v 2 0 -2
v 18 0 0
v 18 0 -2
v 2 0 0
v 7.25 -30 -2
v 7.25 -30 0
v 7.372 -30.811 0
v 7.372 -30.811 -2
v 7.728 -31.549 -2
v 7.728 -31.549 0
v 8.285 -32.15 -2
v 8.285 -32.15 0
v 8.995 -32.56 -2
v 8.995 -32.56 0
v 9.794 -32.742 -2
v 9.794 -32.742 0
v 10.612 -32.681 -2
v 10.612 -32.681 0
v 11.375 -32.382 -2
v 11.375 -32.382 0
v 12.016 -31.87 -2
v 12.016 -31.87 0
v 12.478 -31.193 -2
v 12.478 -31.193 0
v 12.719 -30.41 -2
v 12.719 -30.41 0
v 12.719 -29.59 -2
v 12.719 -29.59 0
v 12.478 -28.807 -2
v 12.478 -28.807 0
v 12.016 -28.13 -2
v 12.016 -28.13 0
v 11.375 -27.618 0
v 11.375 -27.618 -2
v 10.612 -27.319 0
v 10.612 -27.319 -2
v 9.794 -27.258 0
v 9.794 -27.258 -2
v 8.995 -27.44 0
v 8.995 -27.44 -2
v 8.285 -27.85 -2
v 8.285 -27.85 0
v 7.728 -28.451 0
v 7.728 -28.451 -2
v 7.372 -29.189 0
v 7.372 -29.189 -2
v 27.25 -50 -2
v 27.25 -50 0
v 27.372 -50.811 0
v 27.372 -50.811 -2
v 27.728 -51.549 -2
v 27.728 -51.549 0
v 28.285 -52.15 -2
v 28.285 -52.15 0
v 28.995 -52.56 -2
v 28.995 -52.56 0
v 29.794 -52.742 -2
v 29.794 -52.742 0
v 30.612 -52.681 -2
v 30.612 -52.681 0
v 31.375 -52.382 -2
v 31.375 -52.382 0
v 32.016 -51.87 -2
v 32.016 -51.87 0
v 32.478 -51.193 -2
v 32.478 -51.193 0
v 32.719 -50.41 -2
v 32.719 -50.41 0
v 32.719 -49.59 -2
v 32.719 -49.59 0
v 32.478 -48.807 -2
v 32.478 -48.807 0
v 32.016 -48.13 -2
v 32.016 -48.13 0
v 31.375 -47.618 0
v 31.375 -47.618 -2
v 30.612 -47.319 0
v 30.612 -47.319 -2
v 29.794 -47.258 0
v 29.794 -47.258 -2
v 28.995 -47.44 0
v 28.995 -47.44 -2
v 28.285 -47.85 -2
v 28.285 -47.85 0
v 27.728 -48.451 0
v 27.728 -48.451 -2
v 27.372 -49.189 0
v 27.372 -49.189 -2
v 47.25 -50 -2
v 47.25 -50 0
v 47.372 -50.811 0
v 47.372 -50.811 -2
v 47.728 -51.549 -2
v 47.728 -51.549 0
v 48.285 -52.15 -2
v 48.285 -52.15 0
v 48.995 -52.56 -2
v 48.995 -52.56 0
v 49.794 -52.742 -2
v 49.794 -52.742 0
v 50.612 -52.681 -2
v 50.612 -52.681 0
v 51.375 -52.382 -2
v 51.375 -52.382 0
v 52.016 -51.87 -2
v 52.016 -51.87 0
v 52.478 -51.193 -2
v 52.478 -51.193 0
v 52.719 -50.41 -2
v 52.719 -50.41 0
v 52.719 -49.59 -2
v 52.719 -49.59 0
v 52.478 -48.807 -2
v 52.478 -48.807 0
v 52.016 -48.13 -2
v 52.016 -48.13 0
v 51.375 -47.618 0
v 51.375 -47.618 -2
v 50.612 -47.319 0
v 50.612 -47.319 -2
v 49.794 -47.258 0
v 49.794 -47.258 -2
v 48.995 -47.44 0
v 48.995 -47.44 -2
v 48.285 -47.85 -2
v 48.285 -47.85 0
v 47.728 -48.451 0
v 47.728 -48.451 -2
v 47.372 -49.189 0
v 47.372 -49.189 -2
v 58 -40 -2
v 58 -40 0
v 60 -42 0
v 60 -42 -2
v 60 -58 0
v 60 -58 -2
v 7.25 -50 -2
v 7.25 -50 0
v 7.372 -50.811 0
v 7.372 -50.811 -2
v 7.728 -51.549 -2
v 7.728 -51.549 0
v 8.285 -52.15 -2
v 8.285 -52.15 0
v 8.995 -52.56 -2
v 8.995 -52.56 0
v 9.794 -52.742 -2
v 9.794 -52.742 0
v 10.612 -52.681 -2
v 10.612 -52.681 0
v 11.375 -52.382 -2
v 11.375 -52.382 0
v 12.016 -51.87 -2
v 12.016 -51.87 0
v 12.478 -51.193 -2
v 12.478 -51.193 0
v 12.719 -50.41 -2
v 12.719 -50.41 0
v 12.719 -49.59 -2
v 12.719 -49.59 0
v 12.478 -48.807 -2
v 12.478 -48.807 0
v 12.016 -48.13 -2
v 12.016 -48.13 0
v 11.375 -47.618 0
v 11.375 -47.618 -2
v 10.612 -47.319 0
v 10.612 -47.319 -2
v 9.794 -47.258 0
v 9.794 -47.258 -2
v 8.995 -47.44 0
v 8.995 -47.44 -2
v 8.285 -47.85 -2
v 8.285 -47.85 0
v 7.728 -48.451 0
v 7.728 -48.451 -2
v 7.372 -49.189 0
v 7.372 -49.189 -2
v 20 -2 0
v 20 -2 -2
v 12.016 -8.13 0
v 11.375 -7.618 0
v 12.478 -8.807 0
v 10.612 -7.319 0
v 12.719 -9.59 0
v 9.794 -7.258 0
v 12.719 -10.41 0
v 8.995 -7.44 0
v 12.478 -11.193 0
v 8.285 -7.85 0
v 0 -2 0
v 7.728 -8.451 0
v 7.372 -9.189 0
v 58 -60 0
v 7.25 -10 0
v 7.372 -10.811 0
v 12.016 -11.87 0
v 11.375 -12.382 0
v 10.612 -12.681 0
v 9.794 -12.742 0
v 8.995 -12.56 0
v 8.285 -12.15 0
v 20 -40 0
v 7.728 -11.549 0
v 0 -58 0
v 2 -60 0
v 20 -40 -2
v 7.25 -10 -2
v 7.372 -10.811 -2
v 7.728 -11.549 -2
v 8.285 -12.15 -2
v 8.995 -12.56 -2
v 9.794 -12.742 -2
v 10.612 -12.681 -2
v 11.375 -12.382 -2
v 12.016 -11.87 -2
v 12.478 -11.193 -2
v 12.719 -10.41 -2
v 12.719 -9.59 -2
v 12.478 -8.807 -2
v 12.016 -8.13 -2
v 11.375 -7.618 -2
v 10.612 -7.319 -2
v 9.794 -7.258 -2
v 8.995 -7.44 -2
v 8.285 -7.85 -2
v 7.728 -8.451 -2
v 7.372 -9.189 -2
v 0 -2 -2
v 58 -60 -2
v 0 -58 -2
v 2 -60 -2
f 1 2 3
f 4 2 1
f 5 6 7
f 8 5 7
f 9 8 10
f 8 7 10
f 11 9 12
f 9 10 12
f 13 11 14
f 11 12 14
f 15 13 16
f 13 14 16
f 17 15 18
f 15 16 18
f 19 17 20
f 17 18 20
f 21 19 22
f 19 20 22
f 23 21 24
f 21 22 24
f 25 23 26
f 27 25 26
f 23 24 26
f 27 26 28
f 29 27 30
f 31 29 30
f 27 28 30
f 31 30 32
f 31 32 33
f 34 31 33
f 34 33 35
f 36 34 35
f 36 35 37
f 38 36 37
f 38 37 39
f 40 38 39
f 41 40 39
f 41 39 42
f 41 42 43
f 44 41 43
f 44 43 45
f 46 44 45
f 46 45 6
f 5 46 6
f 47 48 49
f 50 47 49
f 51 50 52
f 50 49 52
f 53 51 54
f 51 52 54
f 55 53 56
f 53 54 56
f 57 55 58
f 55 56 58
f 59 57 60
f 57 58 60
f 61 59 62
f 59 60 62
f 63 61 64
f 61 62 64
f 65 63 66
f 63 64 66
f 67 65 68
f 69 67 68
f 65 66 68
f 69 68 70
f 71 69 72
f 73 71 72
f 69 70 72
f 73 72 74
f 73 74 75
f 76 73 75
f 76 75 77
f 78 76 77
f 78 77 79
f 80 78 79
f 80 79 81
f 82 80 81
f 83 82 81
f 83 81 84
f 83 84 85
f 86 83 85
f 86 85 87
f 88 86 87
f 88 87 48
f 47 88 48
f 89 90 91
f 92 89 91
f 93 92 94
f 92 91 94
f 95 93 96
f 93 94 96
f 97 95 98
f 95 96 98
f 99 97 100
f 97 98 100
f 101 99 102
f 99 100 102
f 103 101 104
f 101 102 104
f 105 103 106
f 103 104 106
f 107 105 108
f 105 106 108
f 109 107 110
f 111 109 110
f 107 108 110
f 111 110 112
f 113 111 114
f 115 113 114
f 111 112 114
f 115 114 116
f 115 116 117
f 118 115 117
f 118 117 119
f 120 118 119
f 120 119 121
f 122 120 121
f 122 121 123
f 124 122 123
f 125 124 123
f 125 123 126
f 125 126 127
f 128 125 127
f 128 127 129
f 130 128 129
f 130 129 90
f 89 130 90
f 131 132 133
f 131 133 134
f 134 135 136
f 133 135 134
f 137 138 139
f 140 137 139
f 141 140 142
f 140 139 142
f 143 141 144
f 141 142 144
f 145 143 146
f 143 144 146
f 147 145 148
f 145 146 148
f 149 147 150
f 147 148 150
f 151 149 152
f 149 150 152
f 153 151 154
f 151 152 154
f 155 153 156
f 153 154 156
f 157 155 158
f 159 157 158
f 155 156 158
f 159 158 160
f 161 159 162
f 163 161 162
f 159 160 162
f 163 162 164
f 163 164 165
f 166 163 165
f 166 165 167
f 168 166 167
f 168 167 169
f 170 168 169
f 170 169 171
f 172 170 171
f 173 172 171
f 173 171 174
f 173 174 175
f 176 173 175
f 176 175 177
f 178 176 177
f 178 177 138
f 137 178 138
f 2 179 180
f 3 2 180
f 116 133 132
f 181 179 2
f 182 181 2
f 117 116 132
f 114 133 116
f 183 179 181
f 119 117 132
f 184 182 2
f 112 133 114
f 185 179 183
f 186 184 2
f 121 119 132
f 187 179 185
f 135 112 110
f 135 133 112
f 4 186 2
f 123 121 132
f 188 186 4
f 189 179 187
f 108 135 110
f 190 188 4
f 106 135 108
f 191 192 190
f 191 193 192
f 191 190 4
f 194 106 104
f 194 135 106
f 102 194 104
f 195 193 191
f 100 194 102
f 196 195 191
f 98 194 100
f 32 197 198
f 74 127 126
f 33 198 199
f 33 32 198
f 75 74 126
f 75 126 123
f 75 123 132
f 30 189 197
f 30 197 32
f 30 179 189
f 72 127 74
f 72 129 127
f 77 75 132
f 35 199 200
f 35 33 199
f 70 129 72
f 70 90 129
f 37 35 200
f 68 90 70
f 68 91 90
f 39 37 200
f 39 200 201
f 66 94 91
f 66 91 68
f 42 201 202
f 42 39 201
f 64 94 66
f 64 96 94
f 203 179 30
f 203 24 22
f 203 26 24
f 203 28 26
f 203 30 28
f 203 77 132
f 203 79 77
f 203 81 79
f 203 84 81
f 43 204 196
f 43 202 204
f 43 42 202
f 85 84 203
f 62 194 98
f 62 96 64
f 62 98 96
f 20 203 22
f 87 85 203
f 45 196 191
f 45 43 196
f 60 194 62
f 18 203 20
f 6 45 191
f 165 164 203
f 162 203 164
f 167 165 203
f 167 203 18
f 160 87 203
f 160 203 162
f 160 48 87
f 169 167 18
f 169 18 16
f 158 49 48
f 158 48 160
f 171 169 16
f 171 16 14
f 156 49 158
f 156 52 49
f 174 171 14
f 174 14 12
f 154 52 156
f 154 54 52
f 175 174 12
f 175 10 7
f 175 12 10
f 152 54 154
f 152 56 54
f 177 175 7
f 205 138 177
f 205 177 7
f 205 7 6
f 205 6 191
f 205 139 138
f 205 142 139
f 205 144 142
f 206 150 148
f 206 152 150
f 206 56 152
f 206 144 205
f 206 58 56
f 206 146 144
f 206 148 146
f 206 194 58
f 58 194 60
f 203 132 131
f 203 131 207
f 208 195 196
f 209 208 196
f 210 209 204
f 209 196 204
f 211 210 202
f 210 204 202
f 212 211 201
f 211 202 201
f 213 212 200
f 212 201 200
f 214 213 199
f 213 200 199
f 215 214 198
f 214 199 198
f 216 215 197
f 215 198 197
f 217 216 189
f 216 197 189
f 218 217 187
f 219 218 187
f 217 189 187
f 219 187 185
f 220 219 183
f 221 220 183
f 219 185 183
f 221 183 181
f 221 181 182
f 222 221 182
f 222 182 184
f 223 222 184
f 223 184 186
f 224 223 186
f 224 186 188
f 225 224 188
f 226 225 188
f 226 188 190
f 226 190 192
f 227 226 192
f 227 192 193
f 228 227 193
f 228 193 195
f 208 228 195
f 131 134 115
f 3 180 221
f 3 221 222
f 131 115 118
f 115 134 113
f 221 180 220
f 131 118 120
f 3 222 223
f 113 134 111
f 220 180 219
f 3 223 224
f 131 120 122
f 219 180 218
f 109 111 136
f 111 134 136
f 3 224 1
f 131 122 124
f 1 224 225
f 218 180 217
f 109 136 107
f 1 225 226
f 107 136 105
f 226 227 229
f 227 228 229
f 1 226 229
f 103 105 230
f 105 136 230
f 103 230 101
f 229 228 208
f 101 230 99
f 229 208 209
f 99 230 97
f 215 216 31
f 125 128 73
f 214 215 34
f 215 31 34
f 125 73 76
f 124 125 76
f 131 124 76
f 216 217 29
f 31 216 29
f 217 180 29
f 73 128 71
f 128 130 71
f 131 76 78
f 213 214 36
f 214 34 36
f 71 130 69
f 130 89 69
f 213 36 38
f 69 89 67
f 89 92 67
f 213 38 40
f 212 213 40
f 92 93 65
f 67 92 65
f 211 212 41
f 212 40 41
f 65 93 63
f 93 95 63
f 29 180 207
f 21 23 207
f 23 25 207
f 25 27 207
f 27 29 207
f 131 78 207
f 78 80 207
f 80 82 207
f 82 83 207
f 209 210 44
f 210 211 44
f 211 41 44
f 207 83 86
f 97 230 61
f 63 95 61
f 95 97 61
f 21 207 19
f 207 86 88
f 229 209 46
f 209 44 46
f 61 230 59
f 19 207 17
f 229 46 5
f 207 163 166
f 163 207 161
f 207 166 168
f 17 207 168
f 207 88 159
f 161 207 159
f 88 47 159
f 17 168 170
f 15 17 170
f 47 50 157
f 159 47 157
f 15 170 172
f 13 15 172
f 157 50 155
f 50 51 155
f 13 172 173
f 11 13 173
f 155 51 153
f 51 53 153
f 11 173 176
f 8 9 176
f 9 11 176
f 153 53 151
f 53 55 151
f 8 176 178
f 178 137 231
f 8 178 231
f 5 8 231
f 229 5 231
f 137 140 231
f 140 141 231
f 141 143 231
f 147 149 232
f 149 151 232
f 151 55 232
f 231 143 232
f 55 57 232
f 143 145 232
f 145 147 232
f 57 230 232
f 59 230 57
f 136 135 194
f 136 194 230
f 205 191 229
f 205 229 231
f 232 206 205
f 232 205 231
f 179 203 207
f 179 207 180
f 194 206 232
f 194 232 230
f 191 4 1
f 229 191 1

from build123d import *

# Parameters (mm, degrees)
EXTRUDE_1_DEPTH   = 2
HOLE_WIZARD_M51_D = 5.5
CHAMFER_1_SIZE    = 2


with BuildPart() as part:
    # Эскиз1 → Бобышка-Вытянуть1 (new body)
    with BuildSketch(Plane(origin=(0, 0, 0), x_dir=(1, 0, 0), z_dir=(0, 0, -1))):
        Polygon((0, 0), (0, 60), (60, 60), (60, 40), (20, 40), (20, 0), align=None)
    extrude(amount=EXTRUDE_1_DEPTH)

    # Отверстие с зазором M51 (through all)
    with Locations(Plane(origin=(0, 0, -2), x_dir=(1, 0, 0), z_dir=(0, 0, -1))):
        with Locations((30, 50), (10, 50), (10, 30), (10, 10), (50, 50)):
            Hole(HOLE_WIZARD_M51_D / 2)

    # Фаска1
    chamfer_1_edges = [part.edges().sort_by_distance(p)[0] for p in [
        (0, 0, -1),
        (0, -60, -1),
        (60, -60, -1),
        (60, -40, -1),
        (20, 0, -1),
    ]]
    chamfer(chamfer_1_edges, length=CHAMFER_1_SIZE)


solid = part.part
